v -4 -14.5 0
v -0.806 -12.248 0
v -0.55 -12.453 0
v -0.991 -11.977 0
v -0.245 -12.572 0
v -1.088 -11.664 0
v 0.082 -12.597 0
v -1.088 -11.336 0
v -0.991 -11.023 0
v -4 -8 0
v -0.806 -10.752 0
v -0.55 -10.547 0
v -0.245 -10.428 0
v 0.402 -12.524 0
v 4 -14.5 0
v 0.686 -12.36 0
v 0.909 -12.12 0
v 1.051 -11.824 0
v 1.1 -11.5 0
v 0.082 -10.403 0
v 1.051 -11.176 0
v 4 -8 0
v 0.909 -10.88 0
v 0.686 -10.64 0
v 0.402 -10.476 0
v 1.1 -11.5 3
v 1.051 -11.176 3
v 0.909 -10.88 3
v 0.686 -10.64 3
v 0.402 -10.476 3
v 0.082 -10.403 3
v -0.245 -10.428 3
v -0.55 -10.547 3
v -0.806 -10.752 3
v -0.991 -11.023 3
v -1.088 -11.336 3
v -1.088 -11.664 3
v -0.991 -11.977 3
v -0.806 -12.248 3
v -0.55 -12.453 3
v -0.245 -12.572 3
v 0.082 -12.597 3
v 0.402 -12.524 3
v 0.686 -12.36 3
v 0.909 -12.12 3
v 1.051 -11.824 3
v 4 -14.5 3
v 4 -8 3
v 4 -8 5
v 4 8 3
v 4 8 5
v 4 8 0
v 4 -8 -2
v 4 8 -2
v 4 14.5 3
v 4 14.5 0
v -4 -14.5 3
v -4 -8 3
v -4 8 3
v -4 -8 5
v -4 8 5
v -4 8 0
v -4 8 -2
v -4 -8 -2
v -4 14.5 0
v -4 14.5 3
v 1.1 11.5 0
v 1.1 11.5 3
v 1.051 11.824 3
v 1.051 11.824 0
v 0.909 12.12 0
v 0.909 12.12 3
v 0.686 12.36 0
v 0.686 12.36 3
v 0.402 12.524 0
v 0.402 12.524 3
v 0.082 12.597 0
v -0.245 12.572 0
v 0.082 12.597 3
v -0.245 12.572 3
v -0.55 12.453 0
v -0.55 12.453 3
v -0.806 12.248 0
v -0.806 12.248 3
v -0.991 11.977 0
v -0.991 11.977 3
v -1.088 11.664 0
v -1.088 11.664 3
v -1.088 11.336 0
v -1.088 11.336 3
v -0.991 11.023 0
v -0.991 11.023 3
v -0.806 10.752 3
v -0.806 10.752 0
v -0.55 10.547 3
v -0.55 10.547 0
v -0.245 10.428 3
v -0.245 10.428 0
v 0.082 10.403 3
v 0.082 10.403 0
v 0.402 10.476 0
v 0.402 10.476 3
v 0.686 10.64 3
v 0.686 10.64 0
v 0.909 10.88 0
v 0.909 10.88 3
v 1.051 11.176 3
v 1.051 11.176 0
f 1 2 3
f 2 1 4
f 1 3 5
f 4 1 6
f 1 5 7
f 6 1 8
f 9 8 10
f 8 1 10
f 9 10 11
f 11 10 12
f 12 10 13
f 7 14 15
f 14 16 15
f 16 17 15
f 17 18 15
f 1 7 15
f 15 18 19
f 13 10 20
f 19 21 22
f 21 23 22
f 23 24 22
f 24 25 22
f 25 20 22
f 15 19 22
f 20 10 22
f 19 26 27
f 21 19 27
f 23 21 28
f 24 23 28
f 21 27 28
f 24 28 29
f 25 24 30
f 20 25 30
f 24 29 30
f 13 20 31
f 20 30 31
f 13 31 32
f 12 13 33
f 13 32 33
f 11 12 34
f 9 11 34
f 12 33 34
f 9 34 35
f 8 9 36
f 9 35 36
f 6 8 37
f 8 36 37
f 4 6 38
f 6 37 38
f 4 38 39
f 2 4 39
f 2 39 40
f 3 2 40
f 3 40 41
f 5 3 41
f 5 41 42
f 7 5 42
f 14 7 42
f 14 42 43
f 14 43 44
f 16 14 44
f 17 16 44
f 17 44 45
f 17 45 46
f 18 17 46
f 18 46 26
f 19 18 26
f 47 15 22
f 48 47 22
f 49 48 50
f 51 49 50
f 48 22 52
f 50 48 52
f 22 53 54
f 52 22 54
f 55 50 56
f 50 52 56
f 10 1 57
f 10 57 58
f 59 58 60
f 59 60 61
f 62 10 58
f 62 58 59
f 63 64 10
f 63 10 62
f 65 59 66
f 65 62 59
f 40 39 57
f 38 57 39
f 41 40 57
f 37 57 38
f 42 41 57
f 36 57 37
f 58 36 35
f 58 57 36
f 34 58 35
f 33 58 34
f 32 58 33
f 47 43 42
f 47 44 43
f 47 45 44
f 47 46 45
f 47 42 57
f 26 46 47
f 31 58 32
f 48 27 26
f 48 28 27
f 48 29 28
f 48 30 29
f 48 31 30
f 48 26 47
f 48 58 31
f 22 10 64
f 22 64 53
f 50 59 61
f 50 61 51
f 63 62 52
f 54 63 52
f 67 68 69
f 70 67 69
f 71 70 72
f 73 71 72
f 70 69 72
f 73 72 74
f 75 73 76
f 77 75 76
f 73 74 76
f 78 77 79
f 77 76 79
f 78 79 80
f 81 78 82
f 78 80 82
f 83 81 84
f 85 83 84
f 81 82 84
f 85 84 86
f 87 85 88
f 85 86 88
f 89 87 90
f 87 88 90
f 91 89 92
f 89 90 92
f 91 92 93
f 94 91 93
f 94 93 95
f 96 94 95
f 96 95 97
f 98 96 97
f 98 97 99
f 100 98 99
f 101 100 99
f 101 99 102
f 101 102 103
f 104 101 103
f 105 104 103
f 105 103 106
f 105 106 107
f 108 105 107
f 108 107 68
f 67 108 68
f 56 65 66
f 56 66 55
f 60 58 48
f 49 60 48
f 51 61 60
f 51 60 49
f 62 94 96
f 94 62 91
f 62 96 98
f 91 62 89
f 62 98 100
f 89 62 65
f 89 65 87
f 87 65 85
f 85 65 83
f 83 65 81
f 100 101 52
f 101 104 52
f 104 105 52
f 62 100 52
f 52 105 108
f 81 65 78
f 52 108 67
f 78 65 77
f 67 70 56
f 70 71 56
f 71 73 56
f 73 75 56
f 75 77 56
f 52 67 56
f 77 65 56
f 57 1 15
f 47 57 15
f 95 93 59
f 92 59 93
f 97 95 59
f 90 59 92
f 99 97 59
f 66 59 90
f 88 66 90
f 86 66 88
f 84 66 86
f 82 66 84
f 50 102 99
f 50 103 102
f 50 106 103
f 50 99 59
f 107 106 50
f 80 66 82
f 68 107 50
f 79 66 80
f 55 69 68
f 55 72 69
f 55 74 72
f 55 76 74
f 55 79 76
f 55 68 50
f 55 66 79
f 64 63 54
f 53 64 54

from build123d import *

# Parameters (mm, degrees)
SKETCH_1_W            = 8
SKETCH_1_H            = 29
EXTRUDE_272_DEPTH     = 3
SKETCH_2_W            = 8
SKETCH_2_H            = 16
EXTRUDE_392_DEPTH     = 2
EXTRUDE_START         = 3
SKETCH_2_2_W          = 8
SKETCH_2_2_H          = 16
EXTRUDE_443_DEPTH     = 2
CUT_EXTRUDE_679_REACH = 17.851
SKETCH_3_R            = 1.1


with BuildPart() as part:
    # 草图1 → Extrude 272 (new body)
    with BuildSketch(Plane.XY):
        Rectangle(SKETCH_1_W, SKETCH_1_H)
    extrude(amount=EXTRUDE_272_DEPTH)

    # 草图2 → Extrude 392 (add)
    with BuildSketch(Plane.XY):
        Rectangle(SKETCH_2_W, SKETCH_2_H)
    extrude(amount=-EXTRUDE_392_DEPTH)

    # 草图2<2> → Extrude 443 (add)
    with BuildSketch(Plane.XY.offset(EXTRUDE_START)):
        Rectangle(SKETCH_2_2_W, SKETCH_2_2_H)
    extrude(amount=EXTRUDE_443_DEPTH)

    # 草图3 → Cut-Extrude 679 (cut, up to next)
    with BuildSketch(Plane.XY.offset(3), mode=Mode.PRIVATE) as cut_extrude_679_sk1:
        with Locations((0, 11.5)):
            Circle(SKETCH_3_R)
    cut_extrude_679_tool1 = extrude(cut_extrude_679_sk1.sketch, amount=-CUT_EXTRUDE_679_REACH, mode=Mode.PRIVATE) & part.part
    # 草图3 → Cut-Extrude 679 (cut, up to next)
    with BuildSketch(Plane.XY.offset(3), mode=Mode.PRIVATE) as cut_extrude_679_sk2:
        with Locations((0, -11.5)):
            Circle(SKETCH_3_R)
    cut_extrude_679_tool2 = extrude(cut_extrude_679_sk2.sketch, amount=-CUT_EXTRUDE_679_REACH, mode=Mode.PRIVATE) & part.part
    add(cut_extrude_679_tool1.solids().sort_by_distance((0, 11.5, 3))[0], mode=Mode.SUBTRACT)
    add(cut_extrude_679_tool2.solids().sort_by_distance((0, -11.5, 3))[0], mode=Mode.SUBTRACT)


solid = part.part
